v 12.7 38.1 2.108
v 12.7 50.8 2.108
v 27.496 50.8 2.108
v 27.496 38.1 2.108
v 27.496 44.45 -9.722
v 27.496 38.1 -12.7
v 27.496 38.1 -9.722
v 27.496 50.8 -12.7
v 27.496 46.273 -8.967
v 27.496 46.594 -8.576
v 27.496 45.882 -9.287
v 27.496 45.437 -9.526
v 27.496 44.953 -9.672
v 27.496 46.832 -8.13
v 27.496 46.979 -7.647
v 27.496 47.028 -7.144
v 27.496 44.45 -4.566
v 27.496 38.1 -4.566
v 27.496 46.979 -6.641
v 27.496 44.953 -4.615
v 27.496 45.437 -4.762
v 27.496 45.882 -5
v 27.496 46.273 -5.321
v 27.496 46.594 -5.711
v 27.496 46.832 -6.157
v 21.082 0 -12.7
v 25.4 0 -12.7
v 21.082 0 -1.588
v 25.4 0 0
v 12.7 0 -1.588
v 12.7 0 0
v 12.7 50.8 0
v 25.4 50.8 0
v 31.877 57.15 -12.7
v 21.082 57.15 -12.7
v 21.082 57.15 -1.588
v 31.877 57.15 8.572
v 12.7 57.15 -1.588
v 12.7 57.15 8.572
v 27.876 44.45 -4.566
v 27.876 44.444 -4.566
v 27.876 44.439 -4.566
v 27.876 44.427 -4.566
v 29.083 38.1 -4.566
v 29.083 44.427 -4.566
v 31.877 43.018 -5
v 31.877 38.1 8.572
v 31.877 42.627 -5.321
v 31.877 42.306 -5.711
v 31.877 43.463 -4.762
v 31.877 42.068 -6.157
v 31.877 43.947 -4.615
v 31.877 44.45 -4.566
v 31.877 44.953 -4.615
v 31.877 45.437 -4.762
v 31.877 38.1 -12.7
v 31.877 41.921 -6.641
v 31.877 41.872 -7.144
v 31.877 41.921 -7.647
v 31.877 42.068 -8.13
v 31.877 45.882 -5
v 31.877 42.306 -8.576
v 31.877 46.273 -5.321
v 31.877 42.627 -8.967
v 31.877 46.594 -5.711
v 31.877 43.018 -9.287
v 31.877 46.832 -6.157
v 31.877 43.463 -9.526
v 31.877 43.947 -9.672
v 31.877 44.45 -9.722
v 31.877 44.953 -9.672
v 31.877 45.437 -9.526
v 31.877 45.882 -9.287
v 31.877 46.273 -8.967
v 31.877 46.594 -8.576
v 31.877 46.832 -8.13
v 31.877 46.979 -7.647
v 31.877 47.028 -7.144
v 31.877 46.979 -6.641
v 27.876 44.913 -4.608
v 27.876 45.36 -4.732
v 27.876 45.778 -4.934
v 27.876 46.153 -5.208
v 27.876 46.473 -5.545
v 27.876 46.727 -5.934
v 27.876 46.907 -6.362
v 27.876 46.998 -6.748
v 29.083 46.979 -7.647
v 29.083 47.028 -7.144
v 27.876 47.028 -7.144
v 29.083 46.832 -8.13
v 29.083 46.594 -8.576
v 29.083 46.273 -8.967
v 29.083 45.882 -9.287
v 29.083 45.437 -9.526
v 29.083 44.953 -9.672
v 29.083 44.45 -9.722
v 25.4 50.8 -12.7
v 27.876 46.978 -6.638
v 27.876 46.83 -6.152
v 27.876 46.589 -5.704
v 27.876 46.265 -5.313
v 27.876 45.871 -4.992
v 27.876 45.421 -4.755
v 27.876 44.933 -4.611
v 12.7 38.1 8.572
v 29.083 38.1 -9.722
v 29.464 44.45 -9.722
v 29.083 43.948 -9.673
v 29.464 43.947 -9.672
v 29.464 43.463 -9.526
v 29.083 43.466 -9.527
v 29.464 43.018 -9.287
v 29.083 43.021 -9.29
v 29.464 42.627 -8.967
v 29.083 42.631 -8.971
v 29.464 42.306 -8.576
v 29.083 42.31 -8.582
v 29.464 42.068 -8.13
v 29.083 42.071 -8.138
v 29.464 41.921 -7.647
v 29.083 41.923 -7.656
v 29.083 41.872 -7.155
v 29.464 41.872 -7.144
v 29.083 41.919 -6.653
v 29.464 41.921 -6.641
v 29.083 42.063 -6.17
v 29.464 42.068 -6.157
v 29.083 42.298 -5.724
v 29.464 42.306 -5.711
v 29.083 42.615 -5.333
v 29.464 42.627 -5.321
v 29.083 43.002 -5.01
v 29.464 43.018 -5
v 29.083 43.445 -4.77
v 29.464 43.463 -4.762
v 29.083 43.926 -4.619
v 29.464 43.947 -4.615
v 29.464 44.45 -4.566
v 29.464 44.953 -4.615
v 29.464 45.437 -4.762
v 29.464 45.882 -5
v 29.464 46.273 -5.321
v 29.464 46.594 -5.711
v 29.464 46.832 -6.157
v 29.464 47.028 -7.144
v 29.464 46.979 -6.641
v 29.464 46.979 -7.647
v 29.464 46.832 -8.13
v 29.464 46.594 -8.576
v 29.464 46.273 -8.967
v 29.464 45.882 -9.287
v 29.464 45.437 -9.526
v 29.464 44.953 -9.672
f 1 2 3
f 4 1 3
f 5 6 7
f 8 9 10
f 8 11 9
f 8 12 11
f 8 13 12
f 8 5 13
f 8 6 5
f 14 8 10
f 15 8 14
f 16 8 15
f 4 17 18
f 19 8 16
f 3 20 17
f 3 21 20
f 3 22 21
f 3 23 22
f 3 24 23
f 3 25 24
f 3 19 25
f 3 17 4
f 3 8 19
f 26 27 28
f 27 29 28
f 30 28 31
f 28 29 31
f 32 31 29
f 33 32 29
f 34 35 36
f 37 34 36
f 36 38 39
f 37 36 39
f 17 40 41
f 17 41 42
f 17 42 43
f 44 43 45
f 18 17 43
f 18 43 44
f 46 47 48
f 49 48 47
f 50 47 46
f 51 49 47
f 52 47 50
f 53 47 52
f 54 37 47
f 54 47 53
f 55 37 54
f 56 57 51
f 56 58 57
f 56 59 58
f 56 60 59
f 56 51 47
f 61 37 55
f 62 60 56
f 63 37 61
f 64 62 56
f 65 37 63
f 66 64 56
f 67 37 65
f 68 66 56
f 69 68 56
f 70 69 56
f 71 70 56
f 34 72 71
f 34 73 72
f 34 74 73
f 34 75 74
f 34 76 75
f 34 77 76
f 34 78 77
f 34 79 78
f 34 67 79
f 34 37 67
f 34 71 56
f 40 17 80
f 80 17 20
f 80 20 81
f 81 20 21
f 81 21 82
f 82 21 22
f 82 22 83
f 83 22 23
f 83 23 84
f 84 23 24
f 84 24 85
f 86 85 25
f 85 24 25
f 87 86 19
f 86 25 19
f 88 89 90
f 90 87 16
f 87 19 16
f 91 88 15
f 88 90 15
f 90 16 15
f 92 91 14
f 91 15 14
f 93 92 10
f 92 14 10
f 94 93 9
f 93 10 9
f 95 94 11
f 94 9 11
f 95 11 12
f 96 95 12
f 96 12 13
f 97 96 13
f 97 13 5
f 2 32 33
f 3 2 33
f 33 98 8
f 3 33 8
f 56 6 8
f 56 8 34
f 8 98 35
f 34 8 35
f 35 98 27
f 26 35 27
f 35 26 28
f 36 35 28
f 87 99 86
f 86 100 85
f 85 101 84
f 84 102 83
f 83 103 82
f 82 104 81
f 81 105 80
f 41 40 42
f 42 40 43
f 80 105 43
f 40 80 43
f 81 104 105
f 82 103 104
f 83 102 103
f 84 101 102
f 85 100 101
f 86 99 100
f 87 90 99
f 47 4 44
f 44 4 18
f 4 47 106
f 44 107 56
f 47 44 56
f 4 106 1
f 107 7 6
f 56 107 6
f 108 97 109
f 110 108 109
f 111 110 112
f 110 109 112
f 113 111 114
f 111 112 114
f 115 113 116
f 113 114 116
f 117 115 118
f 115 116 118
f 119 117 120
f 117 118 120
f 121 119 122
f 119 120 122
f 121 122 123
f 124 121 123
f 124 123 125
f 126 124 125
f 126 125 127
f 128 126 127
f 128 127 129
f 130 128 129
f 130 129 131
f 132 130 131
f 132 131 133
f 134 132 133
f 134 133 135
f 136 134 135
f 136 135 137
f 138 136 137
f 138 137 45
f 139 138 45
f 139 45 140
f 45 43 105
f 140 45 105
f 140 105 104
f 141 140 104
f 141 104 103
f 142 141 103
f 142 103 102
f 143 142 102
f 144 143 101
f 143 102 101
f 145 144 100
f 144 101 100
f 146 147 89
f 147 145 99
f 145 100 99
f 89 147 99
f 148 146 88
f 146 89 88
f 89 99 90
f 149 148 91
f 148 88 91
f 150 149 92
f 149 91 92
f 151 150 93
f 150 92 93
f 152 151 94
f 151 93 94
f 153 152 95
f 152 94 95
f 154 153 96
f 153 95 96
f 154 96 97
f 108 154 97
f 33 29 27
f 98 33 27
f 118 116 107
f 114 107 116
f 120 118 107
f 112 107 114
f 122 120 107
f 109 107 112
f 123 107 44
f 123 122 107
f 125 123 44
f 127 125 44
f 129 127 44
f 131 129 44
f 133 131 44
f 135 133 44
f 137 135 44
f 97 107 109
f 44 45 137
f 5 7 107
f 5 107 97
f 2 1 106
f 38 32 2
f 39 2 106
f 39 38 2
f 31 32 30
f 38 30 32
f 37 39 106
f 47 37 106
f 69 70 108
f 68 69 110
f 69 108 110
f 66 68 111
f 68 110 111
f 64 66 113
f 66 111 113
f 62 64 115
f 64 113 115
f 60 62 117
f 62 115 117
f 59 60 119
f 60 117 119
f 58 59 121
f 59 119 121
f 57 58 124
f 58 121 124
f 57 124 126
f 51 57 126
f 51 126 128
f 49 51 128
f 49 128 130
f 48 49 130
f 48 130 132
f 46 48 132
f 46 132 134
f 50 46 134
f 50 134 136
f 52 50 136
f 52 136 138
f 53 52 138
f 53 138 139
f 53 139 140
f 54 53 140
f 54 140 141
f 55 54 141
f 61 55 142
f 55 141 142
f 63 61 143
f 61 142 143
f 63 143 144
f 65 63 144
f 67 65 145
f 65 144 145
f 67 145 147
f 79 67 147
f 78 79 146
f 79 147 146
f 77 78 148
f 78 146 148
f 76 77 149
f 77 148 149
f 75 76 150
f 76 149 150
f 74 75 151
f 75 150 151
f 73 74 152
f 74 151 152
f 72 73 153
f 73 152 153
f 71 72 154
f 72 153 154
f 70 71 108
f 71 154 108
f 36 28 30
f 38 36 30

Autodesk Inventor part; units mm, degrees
ref_plane "YZ Plane" through (0, 0, 0) normal (1, 0, 0) x (0, 1, 0)
ref_plane "XZ Plane" through (0, 0, 0) normal (0, 1, 0) x (-1, 0, 0)
ref_plane "XY Plane" through (0, 0, 0) normal (0, 0, 1) x (1, 0, 0)
sketch "Sketch1" plane through (0, 0, 0) normal (0, 1, 0) x (-1, 0, 0)
  line L0 (0, 0) -> (-12.7, 0)
  line L1 (-12.7, 0) -> (-12.7, -1.5875)
  line L2 (-12.7, -1.5875) -> (0, -1.5875)
  line L3 (0, -1.5875) -> (0, 0)
  line L4 (0, 0) -> (-4.318, 0)
  line L5 (-4.318, 0) -> (-4.318, -12.7)
  line L6 (-4.318, -12.7) -> (0, -12.7)
  line L7 (0, -12.7) -> (0, 0)
  dimension "d0" = 4.318
  dimension "d1" = 12.7
  dimension "d2" = 12.7
  dimension "d33" = 1.5875
extrude "Extrusion1" add sketch "Sketch1" along normal blind 50.8
sketch "Sketch2" plane through (0, 50.8, 0) normal (0, 1, 0) x (1, 0, 0)
  line L0 (12.7, 0) -> (12.7, 1.5875) projected
  line L1 (12.7, 1.5875) -> (-4.064, 1.5875)
  line L2 (-4.064, 1.5875) -> (-4.064, -8.5725)
  line L3 (-4.064, -8.5725) -> (12.7, -8.5725)
  line L4 (12.7, -8.5725) -> (12.7, 1.5875)
  line L5 (4.318, 12.7) -> (-4.064, 12.7)
  line L6 (-4.064, 12.7) -> (-4.064, -8.5725)
  line L7 (-4.064, -8.5725) -> (4.318, -8.5725)
  line L8 (4.318, -8.5725) -> (4.318, 12.7)
  dimension "d26" = 10.16
  dimension "d28" = 16.764
extrude "Extrusion2" add sketch "Sketch2" along normal blind 6.35
sketch "Sketch5" plane through (0, 50.8, 0) normal (0, -1, 0) x (1, 0, 0)
  line L0 (12.7, 8.5725) -> (12.7, 0) projected
  line L1 (-4.064, -12.7) -> (-4.064, 8.5725) projected
  line L2 (12.7, 8.5725) -> (-4.064, 8.5725)
  line L3 (-4.064, 8.5725) -> (-4.064, 2.1082)
  line L4 (-4.064, 2.1082) -> (12.7, 2.1082)
  line L5 (12.7, 2.1082) -> (12.7, 8.5725)
  line L6 (0, -12.7) -> (-4.064, -12.7) projected
  line L7 (-4.064, 8.5725) -> (-2.0955, 8.5725)
  line L8 (-2.0955, 8.5725) -> (-2.0955, -12.7)
  line L9 (-2.0955, -12.7) -> (-4.064, -12.7)
  line L10 (-4.064, -12.7) -> (-4.064, 8.5725)
  line L11 (0, -12.7) -> (0, 0) projected
  line L12 (0, 0) -> (12.7, 0) projected
  dimension "d29" = 2.0955
  dimension "d30" = 2.1082
extrude "Extrusion4" add sketch "Sketch5" along normal blind 12.7 contours L0 L4 L8 L2 | L8 L4 L1 L2 | L8 L6 L1 L4
sketch "Sketch6" plane through (0, 57.15, 0) normal (0, 1, 0) x (1, 0, 0)
  line L0 (12.7, -8.5725) -> (-4.064, -8.5725) projected
  line L1 (12.7, -8.5725) -> (-4.064, -8.5725)
  line L2 (-4.064, -8.5725) -> (-4.064, 12.7)
  line L3 (-4.064, 12.7) -> (12.7, 12.7)
  line L4 (12.7, 12.7) -> (12.7, -8.5725)
  point P0 (0, 0)
mirror "Mirror1" about plane through (12.7, 0, 0) normal (1, 0, 0) of "Extrusion4", "Extrusion2", "Extrusion1"
extrude "Extrusion5" cut sketch "Sketch6" against normal blind 254
sketch "Sketch9" plane through (29.464, 38.1, 8.5725) normal (1, 0, 0) x (0, 0, -1)
  line L0 (10.16, 19.05) -> (10.16, -38.1) projected
  line L1 (21.2725, -38.1) -> (21.2725, 19.05) projected
  line L2 (21.2725, 19.05) -> (0, 19.05) projected
  line L3 (21.2725, 0) -> (6.4643, 0) projected
  line L4 (21.2725, 12.7) -> (8.5725, 12.7) projected
  point P0 (8.5725, -38.1)
  point P1 (15.7162, 6.35)
  dimension "d62" = 11.1125
  dimension "d64" = 5.5563
  dimension "d72" = 12.7
  dimension "d73" = 6.35
hole "Hole3" at (29.464, 44.45, -7.1437) direction (-1, 0, 0) diameter 5.1562 depth 1.5875 tip angle 118
sketch "Sketch10" plane through (29.464, 38.1, 8.5725) normal (1, 0, 0) x (0, 0, -1)
  circle A0 centre (15.7163, 6.35) radius 2.5781 projected
  line L0 (0, 19.05) -> (0, 0) projected
  line L1 (0, 0) -> (21.2725, 0) projected
  line L2 (21.2725, 0) -> (21.2725, 19.05) projected
  line L3 (21.2725, 19.05) -> (0, 19.05) projected
  point P0 (8.5725, -38.1)
extrude "Extrusion6" add sketch "Sketch10" along normal blind 2.413
sketch "Sketch11" plane through (27.4955, 38.1, 2.1082) normal (-1, 0, 0) x (0, 0, 1)
  circle A0 centre (-9.252, 6.35) radius 2.5781 projected
  line L0 (6.4643, 0) -> (-14.8082, 0) projected
  line L1 (-11.8301, 6.35) -> (-6.6739, 6.35)
  line L2 (-6.6739, 6.35) -> (-6.6739, 0)
  line L3 (-6.6739, 0) -> (-11.83, 0)
  line L4 (-11.83, 0) -> (-11.8301, 6.35)
  point P0 (-2.1082, -38.1)
  dimension "d76" = 5.1562
extrude "Extrusion7" cut sketch "Sketch11" against normal blind 1.5875
equation "\"d64\" = 0.5 * d62"
equation "\"d73\" = 0.5 * d72"
properties part number "8GrootTelescope"
